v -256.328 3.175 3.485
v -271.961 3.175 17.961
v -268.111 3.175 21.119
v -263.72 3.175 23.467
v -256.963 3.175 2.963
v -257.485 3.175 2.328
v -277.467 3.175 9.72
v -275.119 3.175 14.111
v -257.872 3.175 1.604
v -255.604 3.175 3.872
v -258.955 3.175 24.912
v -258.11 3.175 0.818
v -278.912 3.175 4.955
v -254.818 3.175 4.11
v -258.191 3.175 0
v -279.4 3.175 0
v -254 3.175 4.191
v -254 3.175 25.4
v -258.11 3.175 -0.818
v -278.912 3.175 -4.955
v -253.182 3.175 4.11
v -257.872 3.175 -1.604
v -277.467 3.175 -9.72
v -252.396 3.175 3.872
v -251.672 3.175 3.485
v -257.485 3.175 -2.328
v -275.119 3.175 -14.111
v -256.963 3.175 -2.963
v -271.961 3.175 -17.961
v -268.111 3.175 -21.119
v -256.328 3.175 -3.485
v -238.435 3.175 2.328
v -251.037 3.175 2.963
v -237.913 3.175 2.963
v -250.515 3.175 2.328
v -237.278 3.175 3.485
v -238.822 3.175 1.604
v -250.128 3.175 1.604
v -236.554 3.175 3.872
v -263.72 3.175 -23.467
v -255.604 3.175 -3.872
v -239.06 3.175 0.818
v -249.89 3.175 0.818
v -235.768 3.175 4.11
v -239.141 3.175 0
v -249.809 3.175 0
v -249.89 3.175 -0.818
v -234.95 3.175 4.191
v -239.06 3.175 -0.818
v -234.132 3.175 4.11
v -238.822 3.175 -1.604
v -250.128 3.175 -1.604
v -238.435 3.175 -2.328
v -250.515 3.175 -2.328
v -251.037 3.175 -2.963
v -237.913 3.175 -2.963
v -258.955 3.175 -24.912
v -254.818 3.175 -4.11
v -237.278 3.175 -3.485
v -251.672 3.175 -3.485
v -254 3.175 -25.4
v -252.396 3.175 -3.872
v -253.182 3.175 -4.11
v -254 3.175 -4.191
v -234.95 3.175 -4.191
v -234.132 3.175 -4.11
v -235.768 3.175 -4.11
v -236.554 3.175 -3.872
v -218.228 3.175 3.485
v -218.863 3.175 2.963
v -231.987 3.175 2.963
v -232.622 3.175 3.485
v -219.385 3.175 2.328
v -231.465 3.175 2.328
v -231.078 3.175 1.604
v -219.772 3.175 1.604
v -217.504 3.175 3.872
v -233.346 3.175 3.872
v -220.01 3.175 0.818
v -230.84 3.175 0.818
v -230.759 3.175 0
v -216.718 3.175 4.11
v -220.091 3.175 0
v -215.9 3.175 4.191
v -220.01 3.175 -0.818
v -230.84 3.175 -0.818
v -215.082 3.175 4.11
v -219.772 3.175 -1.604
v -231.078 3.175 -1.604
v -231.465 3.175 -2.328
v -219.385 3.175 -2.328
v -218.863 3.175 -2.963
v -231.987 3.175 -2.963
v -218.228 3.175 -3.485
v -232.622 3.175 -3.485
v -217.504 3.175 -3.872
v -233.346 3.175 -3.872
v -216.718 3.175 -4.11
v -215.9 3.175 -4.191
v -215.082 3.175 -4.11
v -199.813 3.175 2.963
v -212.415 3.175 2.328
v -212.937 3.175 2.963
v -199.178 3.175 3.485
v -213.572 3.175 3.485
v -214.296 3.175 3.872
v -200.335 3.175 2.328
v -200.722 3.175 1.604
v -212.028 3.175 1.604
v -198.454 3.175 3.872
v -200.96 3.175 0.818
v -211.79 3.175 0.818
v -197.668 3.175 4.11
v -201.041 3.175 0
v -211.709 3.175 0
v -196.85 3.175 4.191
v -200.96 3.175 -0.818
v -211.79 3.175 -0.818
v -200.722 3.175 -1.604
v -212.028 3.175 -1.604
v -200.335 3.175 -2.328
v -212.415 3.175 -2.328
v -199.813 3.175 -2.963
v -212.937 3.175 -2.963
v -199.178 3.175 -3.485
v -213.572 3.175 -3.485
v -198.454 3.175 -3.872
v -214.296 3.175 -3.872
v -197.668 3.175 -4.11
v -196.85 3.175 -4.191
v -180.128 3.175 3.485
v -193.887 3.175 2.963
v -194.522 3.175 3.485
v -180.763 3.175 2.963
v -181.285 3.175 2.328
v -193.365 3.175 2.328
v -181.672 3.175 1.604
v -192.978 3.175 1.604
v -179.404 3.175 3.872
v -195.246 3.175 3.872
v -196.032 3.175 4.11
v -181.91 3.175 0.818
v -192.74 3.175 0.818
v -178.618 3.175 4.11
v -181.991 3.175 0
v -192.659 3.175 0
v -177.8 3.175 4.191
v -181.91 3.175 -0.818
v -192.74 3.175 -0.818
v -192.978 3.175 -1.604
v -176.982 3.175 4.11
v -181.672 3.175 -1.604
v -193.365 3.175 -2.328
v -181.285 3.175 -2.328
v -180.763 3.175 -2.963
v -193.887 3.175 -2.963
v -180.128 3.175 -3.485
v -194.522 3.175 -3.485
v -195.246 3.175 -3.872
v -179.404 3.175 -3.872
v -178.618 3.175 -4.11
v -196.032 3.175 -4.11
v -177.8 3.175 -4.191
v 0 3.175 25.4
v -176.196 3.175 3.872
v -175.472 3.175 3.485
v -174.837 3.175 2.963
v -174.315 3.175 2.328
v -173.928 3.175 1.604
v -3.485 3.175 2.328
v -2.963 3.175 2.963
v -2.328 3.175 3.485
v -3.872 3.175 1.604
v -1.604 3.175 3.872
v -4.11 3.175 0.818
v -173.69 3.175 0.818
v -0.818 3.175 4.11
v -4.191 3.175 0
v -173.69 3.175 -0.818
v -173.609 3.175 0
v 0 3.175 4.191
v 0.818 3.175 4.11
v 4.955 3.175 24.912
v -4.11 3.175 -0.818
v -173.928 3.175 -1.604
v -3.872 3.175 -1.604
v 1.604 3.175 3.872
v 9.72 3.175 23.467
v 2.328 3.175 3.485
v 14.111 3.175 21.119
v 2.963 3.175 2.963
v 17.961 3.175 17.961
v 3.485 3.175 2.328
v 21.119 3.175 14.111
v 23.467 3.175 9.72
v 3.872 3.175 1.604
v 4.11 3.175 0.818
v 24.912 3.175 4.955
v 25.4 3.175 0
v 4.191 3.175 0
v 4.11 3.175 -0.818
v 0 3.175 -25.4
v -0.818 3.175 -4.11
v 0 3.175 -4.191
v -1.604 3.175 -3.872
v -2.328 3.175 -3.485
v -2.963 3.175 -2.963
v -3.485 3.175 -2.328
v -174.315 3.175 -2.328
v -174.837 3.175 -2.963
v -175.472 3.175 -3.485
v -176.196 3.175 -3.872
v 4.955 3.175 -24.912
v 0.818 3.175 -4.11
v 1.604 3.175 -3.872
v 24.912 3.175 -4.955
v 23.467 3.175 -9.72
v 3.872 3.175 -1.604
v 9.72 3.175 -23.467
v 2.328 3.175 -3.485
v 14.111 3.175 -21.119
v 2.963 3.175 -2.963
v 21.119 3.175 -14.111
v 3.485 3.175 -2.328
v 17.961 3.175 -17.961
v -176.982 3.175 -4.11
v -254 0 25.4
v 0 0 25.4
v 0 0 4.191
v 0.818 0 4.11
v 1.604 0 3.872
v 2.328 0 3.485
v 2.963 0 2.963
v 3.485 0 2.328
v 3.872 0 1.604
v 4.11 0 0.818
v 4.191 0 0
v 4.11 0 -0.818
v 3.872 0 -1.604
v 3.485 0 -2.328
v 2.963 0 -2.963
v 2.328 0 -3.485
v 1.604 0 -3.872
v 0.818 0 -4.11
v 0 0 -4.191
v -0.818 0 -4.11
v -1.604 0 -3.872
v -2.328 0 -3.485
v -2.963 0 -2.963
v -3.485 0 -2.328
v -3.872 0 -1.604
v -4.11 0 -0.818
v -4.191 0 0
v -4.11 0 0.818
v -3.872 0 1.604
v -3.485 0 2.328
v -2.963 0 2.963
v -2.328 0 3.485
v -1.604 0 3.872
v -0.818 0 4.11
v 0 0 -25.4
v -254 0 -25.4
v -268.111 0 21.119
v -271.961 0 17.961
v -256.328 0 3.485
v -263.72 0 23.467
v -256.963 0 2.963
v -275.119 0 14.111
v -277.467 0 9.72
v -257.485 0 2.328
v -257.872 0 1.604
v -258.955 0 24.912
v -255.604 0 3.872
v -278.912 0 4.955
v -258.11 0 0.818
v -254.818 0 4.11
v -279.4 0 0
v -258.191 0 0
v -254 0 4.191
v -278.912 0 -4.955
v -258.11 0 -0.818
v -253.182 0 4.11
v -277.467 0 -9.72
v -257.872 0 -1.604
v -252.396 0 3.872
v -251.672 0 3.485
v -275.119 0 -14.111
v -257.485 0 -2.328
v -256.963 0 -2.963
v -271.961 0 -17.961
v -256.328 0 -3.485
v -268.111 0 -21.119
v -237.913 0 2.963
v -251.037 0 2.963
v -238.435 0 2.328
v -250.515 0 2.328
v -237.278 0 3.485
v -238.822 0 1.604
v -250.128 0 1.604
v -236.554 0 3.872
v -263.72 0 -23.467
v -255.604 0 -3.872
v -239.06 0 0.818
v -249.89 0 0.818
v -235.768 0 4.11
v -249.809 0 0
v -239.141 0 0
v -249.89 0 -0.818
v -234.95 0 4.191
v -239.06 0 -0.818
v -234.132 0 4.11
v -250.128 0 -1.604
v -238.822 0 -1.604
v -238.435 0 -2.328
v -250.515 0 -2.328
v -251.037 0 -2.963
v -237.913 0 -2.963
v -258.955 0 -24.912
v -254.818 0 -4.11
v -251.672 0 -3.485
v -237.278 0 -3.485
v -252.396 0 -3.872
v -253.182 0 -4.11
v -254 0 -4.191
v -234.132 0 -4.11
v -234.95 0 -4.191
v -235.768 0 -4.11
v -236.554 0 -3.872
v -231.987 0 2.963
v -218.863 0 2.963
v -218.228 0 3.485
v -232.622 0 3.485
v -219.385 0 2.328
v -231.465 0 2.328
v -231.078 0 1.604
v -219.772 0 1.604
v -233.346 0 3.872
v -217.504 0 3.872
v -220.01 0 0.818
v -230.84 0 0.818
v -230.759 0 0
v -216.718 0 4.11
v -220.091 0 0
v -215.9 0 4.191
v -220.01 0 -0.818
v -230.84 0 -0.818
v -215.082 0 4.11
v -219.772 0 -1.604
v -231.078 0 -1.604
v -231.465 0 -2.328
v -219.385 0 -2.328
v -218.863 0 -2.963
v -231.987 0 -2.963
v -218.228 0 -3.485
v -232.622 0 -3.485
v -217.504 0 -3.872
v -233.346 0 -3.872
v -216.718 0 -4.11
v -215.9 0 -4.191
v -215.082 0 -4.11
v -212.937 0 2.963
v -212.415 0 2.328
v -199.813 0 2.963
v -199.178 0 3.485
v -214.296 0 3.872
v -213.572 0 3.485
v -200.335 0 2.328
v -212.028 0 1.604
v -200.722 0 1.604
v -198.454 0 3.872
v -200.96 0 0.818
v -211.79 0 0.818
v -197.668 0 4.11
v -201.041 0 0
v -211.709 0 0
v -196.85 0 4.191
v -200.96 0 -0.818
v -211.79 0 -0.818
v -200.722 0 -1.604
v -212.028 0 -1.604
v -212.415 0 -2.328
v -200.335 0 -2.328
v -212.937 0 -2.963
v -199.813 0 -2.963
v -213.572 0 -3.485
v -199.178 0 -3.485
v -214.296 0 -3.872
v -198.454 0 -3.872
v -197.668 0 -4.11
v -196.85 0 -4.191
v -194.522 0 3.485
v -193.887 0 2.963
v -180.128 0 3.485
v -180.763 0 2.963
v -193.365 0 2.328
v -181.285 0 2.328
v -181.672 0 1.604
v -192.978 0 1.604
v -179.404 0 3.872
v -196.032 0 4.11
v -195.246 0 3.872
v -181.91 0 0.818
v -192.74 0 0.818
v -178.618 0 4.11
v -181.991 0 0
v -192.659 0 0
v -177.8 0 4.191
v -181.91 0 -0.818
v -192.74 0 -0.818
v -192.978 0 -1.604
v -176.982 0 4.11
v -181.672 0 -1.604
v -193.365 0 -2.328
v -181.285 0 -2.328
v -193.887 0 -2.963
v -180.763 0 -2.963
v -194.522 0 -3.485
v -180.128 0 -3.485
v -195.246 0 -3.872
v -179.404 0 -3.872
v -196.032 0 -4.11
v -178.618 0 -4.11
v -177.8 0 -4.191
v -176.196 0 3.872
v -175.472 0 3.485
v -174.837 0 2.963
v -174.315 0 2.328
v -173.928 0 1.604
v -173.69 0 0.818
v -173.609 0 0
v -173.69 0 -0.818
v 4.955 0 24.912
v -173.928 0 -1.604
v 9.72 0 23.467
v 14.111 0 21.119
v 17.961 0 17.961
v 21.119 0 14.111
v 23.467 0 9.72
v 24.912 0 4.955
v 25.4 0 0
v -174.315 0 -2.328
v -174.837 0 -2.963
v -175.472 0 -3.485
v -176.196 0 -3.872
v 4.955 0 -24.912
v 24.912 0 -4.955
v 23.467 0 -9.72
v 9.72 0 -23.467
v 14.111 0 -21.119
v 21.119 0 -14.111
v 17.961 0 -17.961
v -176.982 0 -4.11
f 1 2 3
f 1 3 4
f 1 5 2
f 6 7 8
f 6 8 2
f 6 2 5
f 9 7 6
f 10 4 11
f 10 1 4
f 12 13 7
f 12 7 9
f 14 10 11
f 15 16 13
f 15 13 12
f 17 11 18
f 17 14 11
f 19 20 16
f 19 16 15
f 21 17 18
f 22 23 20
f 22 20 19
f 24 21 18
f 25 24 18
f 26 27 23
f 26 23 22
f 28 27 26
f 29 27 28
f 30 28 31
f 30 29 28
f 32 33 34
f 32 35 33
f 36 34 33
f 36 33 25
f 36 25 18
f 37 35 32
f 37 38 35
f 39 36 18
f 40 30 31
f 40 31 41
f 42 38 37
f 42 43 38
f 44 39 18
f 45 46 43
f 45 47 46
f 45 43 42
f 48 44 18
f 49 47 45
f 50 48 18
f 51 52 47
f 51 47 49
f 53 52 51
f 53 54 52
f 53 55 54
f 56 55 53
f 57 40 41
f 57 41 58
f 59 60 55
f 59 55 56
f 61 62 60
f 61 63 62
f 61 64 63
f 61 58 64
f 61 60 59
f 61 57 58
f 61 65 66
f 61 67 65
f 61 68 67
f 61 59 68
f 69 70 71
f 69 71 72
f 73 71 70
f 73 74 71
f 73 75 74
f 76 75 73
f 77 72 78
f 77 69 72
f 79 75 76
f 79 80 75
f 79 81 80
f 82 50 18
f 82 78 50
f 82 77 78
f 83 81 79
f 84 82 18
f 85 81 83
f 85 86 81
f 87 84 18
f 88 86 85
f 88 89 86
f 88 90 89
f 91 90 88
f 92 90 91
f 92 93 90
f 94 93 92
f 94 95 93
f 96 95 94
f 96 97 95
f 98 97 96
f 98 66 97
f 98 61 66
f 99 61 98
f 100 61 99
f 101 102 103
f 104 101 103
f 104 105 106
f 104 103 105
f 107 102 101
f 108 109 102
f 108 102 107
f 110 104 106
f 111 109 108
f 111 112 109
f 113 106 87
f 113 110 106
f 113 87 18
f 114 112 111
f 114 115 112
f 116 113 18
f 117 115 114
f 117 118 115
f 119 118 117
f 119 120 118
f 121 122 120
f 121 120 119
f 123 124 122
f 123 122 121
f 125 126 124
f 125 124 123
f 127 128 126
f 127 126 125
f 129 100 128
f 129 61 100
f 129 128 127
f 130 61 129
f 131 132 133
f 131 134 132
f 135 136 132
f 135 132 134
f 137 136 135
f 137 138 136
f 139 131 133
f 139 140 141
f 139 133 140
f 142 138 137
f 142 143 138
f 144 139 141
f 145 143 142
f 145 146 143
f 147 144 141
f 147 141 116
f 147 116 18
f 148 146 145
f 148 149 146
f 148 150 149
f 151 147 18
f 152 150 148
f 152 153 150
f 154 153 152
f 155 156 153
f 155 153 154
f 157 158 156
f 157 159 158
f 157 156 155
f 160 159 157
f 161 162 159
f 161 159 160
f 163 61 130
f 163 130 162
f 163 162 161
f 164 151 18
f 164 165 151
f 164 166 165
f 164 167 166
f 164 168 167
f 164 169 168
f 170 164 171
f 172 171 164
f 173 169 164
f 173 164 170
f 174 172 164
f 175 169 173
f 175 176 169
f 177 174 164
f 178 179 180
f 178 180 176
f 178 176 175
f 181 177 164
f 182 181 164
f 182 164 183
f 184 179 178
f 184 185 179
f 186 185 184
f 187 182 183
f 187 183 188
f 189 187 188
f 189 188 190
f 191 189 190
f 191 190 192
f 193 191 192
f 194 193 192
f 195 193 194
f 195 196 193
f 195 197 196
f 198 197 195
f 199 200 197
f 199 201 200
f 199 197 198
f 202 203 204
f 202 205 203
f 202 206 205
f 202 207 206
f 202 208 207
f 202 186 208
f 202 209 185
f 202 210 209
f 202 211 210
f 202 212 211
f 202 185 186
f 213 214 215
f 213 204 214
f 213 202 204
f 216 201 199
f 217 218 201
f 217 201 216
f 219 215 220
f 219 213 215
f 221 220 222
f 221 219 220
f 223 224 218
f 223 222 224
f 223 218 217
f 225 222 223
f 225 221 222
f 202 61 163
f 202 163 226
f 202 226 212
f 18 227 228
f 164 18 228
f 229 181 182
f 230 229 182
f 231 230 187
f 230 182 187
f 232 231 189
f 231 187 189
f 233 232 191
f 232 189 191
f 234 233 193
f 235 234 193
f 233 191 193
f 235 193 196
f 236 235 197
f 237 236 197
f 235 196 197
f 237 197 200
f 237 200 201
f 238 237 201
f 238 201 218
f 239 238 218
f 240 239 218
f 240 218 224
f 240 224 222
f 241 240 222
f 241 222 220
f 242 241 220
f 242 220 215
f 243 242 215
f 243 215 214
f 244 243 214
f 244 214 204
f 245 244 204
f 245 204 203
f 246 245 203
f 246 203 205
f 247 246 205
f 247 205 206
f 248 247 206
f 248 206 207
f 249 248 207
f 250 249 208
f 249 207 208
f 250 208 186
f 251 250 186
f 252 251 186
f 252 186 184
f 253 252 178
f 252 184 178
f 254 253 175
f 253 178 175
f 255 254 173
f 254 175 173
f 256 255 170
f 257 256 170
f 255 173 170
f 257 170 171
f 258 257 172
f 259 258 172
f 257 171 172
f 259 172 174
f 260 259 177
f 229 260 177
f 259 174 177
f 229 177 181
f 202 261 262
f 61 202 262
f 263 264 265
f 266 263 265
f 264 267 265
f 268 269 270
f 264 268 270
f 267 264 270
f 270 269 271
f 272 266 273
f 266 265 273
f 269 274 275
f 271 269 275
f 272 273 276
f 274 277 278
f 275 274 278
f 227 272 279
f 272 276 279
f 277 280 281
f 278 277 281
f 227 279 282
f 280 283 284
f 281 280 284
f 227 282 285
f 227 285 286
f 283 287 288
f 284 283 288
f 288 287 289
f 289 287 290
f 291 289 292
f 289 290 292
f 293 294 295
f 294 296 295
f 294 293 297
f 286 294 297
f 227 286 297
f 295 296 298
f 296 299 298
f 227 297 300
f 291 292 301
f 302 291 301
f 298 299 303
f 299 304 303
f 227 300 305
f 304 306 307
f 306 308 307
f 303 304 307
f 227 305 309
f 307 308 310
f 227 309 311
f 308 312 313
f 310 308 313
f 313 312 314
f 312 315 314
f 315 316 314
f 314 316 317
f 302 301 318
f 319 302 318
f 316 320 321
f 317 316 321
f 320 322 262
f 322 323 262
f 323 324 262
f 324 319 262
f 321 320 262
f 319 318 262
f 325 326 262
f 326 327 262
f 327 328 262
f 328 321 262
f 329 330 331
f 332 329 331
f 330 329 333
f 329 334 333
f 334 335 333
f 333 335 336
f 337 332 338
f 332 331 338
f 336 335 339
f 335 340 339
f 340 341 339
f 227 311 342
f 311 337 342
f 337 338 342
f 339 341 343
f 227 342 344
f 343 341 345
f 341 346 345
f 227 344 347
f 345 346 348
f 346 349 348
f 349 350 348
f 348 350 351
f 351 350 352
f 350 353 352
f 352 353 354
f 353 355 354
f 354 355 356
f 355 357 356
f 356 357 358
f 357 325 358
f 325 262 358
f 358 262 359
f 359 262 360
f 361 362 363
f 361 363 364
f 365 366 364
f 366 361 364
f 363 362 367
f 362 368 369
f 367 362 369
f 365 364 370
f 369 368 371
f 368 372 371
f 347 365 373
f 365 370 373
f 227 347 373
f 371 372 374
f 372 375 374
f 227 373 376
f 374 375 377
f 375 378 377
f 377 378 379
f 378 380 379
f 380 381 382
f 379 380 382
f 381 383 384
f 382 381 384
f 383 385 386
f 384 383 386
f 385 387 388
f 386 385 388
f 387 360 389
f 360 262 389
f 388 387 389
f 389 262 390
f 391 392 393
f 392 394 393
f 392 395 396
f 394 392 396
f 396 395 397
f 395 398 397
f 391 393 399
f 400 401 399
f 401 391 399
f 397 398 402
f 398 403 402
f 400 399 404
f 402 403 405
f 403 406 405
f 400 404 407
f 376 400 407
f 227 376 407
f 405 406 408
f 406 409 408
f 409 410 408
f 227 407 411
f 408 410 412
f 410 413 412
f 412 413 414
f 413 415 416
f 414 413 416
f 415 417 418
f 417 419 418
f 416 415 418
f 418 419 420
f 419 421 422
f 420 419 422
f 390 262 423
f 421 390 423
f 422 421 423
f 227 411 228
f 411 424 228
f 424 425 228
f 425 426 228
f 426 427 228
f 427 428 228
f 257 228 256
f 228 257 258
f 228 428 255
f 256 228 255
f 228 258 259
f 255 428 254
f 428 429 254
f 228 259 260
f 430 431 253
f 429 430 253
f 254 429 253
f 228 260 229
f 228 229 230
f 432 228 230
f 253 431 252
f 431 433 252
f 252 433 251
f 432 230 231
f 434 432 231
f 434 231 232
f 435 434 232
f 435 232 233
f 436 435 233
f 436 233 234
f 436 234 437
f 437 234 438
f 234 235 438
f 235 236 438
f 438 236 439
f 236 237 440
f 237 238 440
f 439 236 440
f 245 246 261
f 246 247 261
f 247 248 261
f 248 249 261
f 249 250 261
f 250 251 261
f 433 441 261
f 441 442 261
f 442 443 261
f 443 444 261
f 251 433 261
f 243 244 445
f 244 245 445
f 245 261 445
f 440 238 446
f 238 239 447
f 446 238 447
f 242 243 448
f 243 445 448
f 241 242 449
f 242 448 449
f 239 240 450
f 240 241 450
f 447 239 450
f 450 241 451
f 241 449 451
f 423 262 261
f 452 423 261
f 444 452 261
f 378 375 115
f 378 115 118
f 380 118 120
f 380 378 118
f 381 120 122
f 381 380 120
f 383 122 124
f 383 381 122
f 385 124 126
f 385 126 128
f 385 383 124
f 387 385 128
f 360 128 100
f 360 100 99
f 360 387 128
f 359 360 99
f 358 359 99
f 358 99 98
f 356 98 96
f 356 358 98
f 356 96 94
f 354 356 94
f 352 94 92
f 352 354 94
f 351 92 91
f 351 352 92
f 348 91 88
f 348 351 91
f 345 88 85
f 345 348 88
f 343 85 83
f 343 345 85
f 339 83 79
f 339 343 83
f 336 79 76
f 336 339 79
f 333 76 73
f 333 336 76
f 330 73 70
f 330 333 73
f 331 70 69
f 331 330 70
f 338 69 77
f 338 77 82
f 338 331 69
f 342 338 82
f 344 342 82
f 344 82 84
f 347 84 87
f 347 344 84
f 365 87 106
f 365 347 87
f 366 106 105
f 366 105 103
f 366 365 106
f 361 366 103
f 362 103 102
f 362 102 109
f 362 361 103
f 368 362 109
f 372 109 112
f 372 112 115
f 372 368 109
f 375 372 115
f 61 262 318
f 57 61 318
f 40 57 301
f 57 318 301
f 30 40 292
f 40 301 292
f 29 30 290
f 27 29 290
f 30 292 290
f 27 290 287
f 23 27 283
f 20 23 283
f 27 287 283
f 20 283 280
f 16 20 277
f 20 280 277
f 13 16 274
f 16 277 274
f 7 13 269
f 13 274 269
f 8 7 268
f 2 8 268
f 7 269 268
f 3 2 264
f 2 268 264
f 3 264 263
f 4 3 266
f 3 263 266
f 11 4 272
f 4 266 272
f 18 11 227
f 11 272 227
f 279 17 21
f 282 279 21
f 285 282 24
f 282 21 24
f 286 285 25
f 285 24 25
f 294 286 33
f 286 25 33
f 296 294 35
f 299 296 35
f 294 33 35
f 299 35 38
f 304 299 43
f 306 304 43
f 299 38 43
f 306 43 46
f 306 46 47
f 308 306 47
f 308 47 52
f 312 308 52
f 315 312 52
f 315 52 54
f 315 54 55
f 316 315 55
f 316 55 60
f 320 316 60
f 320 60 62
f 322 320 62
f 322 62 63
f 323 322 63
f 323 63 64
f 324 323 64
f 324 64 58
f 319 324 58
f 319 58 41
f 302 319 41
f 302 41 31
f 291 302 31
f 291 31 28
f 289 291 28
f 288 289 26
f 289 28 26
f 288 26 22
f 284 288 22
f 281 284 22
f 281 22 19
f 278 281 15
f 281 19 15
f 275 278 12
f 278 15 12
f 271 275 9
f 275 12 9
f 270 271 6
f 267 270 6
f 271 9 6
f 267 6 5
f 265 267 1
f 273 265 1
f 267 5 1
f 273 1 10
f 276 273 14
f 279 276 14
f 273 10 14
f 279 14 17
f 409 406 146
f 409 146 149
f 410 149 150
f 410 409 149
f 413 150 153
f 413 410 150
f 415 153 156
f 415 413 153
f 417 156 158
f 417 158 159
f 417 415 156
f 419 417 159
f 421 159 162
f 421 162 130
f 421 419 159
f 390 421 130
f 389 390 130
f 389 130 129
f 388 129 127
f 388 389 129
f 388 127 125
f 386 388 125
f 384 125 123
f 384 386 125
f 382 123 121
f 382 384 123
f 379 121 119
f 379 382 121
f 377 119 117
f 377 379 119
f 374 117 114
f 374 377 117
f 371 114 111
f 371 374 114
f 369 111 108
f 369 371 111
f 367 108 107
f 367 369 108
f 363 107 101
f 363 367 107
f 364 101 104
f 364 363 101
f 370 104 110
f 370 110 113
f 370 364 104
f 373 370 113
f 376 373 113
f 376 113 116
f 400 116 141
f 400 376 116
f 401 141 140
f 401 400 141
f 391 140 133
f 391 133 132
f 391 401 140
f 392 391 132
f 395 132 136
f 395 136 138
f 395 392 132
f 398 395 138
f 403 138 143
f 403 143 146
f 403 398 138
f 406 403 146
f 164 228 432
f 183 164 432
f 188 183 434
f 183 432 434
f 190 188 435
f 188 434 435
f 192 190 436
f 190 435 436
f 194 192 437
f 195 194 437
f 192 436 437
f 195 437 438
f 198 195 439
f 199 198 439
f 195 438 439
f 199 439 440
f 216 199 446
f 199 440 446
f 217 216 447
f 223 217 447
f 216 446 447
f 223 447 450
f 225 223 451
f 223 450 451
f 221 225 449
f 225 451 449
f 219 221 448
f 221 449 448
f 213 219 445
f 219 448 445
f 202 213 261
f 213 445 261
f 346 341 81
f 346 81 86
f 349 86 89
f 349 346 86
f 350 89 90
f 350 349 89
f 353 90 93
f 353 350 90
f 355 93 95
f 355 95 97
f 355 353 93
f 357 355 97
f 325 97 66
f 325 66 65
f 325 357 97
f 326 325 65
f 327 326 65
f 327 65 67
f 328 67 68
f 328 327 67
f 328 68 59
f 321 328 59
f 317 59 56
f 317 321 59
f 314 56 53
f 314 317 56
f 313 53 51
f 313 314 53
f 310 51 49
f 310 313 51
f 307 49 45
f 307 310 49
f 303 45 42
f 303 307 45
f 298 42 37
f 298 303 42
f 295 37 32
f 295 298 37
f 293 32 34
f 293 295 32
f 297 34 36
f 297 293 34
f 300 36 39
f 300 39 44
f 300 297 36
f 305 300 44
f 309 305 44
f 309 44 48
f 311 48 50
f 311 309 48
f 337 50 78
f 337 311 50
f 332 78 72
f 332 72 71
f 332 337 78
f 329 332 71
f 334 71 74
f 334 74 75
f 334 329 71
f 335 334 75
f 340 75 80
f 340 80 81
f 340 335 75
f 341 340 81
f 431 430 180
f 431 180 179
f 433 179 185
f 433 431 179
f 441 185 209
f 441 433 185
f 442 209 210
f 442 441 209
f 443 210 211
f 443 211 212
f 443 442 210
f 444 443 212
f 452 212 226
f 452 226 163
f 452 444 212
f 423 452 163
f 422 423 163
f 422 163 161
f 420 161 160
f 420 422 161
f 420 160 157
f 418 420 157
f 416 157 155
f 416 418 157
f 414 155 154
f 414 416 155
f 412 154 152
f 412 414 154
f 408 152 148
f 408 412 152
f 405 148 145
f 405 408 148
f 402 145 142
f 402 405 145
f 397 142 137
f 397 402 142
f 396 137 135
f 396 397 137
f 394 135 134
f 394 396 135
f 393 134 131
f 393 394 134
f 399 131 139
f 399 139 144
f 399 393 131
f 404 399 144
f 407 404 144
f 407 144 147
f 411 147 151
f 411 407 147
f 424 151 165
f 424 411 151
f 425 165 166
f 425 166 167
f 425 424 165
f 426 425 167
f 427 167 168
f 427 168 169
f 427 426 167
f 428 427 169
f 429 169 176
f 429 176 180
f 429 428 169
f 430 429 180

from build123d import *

# Parameters (mm, degrees)
BOSS_EXTRUDE1_DEPTH = 3.175
SKETCH3_R           = 4.191
CUT_EXTRUDE1_DEPTH  = 281.570134948
LPATTERN1_OUTLINE_R = 4.191
LPATTERN1_DEPTH     = 3.175


# Read off the part's stored shape, not the designer's step: LPattern1
with BuildPart() as part:
    # Sketch1 → Boss-Extrude1 (new body)
    with BuildSketch(Plane(origin=(0, 0, 0), x_dir=(1, 0, 0), z_dir=(0, 1, 0))):
        with BuildLine():
            Line((0, 25.4), (-254, 25.4))
            ThreePointArc((-254, 25.4), (-279.4, 0), (-254, -25.4))
            Line((-254, -25.4), (0, -25.4))
            ThreePointArc((0, -25.4), (25.4, 0), (0, 25.4))
        make_face()
    extrude(amount=BOSS_EXTRUDE1_DEPTH)

    # Sketch3 → Cut-Extrude1 (cut, through all)
    with BuildSketch(Plane(origin=(0, 3.175, 0), x_dir=(1, 0, 0), z_dir=(0, 1, 0))):
        with Locations(Location((0, 0, 0), (0, 0, 270))):
            Circle(SKETCH3_R)
        with Locations(Location((-254, 0, 0), (0, 0, 270))):
            Circle(SKETCH3_R)
    extrude(amount=-CUT_EXTRUDE1_DEPTH, mode=Mode.SUBTRACT)

    # LPattern1 outline → LPattern1 (cut)
    with BuildSketch(Plane(origin=(0, 0, 0), x_dir=(1, 0, 0), z_dir=(0, 1, 0))):
        with Locations((-177.8, 0)):
            Circle(LPATTERN1_OUTLINE_R)
        with Locations((-196.85, 0)):
            Circle(LPATTERN1_OUTLINE_R)
        with Locations((-215.9, 0)):
            Circle(LPATTERN1_OUTLINE_R)
        with Locations((-234.95, 0)):
            Circle(LPATTERN1_OUTLINE_R)
    extrude(amount=LPATTERN1_DEPTH, mode=Mode.SUBTRACT)


solid = part.part
